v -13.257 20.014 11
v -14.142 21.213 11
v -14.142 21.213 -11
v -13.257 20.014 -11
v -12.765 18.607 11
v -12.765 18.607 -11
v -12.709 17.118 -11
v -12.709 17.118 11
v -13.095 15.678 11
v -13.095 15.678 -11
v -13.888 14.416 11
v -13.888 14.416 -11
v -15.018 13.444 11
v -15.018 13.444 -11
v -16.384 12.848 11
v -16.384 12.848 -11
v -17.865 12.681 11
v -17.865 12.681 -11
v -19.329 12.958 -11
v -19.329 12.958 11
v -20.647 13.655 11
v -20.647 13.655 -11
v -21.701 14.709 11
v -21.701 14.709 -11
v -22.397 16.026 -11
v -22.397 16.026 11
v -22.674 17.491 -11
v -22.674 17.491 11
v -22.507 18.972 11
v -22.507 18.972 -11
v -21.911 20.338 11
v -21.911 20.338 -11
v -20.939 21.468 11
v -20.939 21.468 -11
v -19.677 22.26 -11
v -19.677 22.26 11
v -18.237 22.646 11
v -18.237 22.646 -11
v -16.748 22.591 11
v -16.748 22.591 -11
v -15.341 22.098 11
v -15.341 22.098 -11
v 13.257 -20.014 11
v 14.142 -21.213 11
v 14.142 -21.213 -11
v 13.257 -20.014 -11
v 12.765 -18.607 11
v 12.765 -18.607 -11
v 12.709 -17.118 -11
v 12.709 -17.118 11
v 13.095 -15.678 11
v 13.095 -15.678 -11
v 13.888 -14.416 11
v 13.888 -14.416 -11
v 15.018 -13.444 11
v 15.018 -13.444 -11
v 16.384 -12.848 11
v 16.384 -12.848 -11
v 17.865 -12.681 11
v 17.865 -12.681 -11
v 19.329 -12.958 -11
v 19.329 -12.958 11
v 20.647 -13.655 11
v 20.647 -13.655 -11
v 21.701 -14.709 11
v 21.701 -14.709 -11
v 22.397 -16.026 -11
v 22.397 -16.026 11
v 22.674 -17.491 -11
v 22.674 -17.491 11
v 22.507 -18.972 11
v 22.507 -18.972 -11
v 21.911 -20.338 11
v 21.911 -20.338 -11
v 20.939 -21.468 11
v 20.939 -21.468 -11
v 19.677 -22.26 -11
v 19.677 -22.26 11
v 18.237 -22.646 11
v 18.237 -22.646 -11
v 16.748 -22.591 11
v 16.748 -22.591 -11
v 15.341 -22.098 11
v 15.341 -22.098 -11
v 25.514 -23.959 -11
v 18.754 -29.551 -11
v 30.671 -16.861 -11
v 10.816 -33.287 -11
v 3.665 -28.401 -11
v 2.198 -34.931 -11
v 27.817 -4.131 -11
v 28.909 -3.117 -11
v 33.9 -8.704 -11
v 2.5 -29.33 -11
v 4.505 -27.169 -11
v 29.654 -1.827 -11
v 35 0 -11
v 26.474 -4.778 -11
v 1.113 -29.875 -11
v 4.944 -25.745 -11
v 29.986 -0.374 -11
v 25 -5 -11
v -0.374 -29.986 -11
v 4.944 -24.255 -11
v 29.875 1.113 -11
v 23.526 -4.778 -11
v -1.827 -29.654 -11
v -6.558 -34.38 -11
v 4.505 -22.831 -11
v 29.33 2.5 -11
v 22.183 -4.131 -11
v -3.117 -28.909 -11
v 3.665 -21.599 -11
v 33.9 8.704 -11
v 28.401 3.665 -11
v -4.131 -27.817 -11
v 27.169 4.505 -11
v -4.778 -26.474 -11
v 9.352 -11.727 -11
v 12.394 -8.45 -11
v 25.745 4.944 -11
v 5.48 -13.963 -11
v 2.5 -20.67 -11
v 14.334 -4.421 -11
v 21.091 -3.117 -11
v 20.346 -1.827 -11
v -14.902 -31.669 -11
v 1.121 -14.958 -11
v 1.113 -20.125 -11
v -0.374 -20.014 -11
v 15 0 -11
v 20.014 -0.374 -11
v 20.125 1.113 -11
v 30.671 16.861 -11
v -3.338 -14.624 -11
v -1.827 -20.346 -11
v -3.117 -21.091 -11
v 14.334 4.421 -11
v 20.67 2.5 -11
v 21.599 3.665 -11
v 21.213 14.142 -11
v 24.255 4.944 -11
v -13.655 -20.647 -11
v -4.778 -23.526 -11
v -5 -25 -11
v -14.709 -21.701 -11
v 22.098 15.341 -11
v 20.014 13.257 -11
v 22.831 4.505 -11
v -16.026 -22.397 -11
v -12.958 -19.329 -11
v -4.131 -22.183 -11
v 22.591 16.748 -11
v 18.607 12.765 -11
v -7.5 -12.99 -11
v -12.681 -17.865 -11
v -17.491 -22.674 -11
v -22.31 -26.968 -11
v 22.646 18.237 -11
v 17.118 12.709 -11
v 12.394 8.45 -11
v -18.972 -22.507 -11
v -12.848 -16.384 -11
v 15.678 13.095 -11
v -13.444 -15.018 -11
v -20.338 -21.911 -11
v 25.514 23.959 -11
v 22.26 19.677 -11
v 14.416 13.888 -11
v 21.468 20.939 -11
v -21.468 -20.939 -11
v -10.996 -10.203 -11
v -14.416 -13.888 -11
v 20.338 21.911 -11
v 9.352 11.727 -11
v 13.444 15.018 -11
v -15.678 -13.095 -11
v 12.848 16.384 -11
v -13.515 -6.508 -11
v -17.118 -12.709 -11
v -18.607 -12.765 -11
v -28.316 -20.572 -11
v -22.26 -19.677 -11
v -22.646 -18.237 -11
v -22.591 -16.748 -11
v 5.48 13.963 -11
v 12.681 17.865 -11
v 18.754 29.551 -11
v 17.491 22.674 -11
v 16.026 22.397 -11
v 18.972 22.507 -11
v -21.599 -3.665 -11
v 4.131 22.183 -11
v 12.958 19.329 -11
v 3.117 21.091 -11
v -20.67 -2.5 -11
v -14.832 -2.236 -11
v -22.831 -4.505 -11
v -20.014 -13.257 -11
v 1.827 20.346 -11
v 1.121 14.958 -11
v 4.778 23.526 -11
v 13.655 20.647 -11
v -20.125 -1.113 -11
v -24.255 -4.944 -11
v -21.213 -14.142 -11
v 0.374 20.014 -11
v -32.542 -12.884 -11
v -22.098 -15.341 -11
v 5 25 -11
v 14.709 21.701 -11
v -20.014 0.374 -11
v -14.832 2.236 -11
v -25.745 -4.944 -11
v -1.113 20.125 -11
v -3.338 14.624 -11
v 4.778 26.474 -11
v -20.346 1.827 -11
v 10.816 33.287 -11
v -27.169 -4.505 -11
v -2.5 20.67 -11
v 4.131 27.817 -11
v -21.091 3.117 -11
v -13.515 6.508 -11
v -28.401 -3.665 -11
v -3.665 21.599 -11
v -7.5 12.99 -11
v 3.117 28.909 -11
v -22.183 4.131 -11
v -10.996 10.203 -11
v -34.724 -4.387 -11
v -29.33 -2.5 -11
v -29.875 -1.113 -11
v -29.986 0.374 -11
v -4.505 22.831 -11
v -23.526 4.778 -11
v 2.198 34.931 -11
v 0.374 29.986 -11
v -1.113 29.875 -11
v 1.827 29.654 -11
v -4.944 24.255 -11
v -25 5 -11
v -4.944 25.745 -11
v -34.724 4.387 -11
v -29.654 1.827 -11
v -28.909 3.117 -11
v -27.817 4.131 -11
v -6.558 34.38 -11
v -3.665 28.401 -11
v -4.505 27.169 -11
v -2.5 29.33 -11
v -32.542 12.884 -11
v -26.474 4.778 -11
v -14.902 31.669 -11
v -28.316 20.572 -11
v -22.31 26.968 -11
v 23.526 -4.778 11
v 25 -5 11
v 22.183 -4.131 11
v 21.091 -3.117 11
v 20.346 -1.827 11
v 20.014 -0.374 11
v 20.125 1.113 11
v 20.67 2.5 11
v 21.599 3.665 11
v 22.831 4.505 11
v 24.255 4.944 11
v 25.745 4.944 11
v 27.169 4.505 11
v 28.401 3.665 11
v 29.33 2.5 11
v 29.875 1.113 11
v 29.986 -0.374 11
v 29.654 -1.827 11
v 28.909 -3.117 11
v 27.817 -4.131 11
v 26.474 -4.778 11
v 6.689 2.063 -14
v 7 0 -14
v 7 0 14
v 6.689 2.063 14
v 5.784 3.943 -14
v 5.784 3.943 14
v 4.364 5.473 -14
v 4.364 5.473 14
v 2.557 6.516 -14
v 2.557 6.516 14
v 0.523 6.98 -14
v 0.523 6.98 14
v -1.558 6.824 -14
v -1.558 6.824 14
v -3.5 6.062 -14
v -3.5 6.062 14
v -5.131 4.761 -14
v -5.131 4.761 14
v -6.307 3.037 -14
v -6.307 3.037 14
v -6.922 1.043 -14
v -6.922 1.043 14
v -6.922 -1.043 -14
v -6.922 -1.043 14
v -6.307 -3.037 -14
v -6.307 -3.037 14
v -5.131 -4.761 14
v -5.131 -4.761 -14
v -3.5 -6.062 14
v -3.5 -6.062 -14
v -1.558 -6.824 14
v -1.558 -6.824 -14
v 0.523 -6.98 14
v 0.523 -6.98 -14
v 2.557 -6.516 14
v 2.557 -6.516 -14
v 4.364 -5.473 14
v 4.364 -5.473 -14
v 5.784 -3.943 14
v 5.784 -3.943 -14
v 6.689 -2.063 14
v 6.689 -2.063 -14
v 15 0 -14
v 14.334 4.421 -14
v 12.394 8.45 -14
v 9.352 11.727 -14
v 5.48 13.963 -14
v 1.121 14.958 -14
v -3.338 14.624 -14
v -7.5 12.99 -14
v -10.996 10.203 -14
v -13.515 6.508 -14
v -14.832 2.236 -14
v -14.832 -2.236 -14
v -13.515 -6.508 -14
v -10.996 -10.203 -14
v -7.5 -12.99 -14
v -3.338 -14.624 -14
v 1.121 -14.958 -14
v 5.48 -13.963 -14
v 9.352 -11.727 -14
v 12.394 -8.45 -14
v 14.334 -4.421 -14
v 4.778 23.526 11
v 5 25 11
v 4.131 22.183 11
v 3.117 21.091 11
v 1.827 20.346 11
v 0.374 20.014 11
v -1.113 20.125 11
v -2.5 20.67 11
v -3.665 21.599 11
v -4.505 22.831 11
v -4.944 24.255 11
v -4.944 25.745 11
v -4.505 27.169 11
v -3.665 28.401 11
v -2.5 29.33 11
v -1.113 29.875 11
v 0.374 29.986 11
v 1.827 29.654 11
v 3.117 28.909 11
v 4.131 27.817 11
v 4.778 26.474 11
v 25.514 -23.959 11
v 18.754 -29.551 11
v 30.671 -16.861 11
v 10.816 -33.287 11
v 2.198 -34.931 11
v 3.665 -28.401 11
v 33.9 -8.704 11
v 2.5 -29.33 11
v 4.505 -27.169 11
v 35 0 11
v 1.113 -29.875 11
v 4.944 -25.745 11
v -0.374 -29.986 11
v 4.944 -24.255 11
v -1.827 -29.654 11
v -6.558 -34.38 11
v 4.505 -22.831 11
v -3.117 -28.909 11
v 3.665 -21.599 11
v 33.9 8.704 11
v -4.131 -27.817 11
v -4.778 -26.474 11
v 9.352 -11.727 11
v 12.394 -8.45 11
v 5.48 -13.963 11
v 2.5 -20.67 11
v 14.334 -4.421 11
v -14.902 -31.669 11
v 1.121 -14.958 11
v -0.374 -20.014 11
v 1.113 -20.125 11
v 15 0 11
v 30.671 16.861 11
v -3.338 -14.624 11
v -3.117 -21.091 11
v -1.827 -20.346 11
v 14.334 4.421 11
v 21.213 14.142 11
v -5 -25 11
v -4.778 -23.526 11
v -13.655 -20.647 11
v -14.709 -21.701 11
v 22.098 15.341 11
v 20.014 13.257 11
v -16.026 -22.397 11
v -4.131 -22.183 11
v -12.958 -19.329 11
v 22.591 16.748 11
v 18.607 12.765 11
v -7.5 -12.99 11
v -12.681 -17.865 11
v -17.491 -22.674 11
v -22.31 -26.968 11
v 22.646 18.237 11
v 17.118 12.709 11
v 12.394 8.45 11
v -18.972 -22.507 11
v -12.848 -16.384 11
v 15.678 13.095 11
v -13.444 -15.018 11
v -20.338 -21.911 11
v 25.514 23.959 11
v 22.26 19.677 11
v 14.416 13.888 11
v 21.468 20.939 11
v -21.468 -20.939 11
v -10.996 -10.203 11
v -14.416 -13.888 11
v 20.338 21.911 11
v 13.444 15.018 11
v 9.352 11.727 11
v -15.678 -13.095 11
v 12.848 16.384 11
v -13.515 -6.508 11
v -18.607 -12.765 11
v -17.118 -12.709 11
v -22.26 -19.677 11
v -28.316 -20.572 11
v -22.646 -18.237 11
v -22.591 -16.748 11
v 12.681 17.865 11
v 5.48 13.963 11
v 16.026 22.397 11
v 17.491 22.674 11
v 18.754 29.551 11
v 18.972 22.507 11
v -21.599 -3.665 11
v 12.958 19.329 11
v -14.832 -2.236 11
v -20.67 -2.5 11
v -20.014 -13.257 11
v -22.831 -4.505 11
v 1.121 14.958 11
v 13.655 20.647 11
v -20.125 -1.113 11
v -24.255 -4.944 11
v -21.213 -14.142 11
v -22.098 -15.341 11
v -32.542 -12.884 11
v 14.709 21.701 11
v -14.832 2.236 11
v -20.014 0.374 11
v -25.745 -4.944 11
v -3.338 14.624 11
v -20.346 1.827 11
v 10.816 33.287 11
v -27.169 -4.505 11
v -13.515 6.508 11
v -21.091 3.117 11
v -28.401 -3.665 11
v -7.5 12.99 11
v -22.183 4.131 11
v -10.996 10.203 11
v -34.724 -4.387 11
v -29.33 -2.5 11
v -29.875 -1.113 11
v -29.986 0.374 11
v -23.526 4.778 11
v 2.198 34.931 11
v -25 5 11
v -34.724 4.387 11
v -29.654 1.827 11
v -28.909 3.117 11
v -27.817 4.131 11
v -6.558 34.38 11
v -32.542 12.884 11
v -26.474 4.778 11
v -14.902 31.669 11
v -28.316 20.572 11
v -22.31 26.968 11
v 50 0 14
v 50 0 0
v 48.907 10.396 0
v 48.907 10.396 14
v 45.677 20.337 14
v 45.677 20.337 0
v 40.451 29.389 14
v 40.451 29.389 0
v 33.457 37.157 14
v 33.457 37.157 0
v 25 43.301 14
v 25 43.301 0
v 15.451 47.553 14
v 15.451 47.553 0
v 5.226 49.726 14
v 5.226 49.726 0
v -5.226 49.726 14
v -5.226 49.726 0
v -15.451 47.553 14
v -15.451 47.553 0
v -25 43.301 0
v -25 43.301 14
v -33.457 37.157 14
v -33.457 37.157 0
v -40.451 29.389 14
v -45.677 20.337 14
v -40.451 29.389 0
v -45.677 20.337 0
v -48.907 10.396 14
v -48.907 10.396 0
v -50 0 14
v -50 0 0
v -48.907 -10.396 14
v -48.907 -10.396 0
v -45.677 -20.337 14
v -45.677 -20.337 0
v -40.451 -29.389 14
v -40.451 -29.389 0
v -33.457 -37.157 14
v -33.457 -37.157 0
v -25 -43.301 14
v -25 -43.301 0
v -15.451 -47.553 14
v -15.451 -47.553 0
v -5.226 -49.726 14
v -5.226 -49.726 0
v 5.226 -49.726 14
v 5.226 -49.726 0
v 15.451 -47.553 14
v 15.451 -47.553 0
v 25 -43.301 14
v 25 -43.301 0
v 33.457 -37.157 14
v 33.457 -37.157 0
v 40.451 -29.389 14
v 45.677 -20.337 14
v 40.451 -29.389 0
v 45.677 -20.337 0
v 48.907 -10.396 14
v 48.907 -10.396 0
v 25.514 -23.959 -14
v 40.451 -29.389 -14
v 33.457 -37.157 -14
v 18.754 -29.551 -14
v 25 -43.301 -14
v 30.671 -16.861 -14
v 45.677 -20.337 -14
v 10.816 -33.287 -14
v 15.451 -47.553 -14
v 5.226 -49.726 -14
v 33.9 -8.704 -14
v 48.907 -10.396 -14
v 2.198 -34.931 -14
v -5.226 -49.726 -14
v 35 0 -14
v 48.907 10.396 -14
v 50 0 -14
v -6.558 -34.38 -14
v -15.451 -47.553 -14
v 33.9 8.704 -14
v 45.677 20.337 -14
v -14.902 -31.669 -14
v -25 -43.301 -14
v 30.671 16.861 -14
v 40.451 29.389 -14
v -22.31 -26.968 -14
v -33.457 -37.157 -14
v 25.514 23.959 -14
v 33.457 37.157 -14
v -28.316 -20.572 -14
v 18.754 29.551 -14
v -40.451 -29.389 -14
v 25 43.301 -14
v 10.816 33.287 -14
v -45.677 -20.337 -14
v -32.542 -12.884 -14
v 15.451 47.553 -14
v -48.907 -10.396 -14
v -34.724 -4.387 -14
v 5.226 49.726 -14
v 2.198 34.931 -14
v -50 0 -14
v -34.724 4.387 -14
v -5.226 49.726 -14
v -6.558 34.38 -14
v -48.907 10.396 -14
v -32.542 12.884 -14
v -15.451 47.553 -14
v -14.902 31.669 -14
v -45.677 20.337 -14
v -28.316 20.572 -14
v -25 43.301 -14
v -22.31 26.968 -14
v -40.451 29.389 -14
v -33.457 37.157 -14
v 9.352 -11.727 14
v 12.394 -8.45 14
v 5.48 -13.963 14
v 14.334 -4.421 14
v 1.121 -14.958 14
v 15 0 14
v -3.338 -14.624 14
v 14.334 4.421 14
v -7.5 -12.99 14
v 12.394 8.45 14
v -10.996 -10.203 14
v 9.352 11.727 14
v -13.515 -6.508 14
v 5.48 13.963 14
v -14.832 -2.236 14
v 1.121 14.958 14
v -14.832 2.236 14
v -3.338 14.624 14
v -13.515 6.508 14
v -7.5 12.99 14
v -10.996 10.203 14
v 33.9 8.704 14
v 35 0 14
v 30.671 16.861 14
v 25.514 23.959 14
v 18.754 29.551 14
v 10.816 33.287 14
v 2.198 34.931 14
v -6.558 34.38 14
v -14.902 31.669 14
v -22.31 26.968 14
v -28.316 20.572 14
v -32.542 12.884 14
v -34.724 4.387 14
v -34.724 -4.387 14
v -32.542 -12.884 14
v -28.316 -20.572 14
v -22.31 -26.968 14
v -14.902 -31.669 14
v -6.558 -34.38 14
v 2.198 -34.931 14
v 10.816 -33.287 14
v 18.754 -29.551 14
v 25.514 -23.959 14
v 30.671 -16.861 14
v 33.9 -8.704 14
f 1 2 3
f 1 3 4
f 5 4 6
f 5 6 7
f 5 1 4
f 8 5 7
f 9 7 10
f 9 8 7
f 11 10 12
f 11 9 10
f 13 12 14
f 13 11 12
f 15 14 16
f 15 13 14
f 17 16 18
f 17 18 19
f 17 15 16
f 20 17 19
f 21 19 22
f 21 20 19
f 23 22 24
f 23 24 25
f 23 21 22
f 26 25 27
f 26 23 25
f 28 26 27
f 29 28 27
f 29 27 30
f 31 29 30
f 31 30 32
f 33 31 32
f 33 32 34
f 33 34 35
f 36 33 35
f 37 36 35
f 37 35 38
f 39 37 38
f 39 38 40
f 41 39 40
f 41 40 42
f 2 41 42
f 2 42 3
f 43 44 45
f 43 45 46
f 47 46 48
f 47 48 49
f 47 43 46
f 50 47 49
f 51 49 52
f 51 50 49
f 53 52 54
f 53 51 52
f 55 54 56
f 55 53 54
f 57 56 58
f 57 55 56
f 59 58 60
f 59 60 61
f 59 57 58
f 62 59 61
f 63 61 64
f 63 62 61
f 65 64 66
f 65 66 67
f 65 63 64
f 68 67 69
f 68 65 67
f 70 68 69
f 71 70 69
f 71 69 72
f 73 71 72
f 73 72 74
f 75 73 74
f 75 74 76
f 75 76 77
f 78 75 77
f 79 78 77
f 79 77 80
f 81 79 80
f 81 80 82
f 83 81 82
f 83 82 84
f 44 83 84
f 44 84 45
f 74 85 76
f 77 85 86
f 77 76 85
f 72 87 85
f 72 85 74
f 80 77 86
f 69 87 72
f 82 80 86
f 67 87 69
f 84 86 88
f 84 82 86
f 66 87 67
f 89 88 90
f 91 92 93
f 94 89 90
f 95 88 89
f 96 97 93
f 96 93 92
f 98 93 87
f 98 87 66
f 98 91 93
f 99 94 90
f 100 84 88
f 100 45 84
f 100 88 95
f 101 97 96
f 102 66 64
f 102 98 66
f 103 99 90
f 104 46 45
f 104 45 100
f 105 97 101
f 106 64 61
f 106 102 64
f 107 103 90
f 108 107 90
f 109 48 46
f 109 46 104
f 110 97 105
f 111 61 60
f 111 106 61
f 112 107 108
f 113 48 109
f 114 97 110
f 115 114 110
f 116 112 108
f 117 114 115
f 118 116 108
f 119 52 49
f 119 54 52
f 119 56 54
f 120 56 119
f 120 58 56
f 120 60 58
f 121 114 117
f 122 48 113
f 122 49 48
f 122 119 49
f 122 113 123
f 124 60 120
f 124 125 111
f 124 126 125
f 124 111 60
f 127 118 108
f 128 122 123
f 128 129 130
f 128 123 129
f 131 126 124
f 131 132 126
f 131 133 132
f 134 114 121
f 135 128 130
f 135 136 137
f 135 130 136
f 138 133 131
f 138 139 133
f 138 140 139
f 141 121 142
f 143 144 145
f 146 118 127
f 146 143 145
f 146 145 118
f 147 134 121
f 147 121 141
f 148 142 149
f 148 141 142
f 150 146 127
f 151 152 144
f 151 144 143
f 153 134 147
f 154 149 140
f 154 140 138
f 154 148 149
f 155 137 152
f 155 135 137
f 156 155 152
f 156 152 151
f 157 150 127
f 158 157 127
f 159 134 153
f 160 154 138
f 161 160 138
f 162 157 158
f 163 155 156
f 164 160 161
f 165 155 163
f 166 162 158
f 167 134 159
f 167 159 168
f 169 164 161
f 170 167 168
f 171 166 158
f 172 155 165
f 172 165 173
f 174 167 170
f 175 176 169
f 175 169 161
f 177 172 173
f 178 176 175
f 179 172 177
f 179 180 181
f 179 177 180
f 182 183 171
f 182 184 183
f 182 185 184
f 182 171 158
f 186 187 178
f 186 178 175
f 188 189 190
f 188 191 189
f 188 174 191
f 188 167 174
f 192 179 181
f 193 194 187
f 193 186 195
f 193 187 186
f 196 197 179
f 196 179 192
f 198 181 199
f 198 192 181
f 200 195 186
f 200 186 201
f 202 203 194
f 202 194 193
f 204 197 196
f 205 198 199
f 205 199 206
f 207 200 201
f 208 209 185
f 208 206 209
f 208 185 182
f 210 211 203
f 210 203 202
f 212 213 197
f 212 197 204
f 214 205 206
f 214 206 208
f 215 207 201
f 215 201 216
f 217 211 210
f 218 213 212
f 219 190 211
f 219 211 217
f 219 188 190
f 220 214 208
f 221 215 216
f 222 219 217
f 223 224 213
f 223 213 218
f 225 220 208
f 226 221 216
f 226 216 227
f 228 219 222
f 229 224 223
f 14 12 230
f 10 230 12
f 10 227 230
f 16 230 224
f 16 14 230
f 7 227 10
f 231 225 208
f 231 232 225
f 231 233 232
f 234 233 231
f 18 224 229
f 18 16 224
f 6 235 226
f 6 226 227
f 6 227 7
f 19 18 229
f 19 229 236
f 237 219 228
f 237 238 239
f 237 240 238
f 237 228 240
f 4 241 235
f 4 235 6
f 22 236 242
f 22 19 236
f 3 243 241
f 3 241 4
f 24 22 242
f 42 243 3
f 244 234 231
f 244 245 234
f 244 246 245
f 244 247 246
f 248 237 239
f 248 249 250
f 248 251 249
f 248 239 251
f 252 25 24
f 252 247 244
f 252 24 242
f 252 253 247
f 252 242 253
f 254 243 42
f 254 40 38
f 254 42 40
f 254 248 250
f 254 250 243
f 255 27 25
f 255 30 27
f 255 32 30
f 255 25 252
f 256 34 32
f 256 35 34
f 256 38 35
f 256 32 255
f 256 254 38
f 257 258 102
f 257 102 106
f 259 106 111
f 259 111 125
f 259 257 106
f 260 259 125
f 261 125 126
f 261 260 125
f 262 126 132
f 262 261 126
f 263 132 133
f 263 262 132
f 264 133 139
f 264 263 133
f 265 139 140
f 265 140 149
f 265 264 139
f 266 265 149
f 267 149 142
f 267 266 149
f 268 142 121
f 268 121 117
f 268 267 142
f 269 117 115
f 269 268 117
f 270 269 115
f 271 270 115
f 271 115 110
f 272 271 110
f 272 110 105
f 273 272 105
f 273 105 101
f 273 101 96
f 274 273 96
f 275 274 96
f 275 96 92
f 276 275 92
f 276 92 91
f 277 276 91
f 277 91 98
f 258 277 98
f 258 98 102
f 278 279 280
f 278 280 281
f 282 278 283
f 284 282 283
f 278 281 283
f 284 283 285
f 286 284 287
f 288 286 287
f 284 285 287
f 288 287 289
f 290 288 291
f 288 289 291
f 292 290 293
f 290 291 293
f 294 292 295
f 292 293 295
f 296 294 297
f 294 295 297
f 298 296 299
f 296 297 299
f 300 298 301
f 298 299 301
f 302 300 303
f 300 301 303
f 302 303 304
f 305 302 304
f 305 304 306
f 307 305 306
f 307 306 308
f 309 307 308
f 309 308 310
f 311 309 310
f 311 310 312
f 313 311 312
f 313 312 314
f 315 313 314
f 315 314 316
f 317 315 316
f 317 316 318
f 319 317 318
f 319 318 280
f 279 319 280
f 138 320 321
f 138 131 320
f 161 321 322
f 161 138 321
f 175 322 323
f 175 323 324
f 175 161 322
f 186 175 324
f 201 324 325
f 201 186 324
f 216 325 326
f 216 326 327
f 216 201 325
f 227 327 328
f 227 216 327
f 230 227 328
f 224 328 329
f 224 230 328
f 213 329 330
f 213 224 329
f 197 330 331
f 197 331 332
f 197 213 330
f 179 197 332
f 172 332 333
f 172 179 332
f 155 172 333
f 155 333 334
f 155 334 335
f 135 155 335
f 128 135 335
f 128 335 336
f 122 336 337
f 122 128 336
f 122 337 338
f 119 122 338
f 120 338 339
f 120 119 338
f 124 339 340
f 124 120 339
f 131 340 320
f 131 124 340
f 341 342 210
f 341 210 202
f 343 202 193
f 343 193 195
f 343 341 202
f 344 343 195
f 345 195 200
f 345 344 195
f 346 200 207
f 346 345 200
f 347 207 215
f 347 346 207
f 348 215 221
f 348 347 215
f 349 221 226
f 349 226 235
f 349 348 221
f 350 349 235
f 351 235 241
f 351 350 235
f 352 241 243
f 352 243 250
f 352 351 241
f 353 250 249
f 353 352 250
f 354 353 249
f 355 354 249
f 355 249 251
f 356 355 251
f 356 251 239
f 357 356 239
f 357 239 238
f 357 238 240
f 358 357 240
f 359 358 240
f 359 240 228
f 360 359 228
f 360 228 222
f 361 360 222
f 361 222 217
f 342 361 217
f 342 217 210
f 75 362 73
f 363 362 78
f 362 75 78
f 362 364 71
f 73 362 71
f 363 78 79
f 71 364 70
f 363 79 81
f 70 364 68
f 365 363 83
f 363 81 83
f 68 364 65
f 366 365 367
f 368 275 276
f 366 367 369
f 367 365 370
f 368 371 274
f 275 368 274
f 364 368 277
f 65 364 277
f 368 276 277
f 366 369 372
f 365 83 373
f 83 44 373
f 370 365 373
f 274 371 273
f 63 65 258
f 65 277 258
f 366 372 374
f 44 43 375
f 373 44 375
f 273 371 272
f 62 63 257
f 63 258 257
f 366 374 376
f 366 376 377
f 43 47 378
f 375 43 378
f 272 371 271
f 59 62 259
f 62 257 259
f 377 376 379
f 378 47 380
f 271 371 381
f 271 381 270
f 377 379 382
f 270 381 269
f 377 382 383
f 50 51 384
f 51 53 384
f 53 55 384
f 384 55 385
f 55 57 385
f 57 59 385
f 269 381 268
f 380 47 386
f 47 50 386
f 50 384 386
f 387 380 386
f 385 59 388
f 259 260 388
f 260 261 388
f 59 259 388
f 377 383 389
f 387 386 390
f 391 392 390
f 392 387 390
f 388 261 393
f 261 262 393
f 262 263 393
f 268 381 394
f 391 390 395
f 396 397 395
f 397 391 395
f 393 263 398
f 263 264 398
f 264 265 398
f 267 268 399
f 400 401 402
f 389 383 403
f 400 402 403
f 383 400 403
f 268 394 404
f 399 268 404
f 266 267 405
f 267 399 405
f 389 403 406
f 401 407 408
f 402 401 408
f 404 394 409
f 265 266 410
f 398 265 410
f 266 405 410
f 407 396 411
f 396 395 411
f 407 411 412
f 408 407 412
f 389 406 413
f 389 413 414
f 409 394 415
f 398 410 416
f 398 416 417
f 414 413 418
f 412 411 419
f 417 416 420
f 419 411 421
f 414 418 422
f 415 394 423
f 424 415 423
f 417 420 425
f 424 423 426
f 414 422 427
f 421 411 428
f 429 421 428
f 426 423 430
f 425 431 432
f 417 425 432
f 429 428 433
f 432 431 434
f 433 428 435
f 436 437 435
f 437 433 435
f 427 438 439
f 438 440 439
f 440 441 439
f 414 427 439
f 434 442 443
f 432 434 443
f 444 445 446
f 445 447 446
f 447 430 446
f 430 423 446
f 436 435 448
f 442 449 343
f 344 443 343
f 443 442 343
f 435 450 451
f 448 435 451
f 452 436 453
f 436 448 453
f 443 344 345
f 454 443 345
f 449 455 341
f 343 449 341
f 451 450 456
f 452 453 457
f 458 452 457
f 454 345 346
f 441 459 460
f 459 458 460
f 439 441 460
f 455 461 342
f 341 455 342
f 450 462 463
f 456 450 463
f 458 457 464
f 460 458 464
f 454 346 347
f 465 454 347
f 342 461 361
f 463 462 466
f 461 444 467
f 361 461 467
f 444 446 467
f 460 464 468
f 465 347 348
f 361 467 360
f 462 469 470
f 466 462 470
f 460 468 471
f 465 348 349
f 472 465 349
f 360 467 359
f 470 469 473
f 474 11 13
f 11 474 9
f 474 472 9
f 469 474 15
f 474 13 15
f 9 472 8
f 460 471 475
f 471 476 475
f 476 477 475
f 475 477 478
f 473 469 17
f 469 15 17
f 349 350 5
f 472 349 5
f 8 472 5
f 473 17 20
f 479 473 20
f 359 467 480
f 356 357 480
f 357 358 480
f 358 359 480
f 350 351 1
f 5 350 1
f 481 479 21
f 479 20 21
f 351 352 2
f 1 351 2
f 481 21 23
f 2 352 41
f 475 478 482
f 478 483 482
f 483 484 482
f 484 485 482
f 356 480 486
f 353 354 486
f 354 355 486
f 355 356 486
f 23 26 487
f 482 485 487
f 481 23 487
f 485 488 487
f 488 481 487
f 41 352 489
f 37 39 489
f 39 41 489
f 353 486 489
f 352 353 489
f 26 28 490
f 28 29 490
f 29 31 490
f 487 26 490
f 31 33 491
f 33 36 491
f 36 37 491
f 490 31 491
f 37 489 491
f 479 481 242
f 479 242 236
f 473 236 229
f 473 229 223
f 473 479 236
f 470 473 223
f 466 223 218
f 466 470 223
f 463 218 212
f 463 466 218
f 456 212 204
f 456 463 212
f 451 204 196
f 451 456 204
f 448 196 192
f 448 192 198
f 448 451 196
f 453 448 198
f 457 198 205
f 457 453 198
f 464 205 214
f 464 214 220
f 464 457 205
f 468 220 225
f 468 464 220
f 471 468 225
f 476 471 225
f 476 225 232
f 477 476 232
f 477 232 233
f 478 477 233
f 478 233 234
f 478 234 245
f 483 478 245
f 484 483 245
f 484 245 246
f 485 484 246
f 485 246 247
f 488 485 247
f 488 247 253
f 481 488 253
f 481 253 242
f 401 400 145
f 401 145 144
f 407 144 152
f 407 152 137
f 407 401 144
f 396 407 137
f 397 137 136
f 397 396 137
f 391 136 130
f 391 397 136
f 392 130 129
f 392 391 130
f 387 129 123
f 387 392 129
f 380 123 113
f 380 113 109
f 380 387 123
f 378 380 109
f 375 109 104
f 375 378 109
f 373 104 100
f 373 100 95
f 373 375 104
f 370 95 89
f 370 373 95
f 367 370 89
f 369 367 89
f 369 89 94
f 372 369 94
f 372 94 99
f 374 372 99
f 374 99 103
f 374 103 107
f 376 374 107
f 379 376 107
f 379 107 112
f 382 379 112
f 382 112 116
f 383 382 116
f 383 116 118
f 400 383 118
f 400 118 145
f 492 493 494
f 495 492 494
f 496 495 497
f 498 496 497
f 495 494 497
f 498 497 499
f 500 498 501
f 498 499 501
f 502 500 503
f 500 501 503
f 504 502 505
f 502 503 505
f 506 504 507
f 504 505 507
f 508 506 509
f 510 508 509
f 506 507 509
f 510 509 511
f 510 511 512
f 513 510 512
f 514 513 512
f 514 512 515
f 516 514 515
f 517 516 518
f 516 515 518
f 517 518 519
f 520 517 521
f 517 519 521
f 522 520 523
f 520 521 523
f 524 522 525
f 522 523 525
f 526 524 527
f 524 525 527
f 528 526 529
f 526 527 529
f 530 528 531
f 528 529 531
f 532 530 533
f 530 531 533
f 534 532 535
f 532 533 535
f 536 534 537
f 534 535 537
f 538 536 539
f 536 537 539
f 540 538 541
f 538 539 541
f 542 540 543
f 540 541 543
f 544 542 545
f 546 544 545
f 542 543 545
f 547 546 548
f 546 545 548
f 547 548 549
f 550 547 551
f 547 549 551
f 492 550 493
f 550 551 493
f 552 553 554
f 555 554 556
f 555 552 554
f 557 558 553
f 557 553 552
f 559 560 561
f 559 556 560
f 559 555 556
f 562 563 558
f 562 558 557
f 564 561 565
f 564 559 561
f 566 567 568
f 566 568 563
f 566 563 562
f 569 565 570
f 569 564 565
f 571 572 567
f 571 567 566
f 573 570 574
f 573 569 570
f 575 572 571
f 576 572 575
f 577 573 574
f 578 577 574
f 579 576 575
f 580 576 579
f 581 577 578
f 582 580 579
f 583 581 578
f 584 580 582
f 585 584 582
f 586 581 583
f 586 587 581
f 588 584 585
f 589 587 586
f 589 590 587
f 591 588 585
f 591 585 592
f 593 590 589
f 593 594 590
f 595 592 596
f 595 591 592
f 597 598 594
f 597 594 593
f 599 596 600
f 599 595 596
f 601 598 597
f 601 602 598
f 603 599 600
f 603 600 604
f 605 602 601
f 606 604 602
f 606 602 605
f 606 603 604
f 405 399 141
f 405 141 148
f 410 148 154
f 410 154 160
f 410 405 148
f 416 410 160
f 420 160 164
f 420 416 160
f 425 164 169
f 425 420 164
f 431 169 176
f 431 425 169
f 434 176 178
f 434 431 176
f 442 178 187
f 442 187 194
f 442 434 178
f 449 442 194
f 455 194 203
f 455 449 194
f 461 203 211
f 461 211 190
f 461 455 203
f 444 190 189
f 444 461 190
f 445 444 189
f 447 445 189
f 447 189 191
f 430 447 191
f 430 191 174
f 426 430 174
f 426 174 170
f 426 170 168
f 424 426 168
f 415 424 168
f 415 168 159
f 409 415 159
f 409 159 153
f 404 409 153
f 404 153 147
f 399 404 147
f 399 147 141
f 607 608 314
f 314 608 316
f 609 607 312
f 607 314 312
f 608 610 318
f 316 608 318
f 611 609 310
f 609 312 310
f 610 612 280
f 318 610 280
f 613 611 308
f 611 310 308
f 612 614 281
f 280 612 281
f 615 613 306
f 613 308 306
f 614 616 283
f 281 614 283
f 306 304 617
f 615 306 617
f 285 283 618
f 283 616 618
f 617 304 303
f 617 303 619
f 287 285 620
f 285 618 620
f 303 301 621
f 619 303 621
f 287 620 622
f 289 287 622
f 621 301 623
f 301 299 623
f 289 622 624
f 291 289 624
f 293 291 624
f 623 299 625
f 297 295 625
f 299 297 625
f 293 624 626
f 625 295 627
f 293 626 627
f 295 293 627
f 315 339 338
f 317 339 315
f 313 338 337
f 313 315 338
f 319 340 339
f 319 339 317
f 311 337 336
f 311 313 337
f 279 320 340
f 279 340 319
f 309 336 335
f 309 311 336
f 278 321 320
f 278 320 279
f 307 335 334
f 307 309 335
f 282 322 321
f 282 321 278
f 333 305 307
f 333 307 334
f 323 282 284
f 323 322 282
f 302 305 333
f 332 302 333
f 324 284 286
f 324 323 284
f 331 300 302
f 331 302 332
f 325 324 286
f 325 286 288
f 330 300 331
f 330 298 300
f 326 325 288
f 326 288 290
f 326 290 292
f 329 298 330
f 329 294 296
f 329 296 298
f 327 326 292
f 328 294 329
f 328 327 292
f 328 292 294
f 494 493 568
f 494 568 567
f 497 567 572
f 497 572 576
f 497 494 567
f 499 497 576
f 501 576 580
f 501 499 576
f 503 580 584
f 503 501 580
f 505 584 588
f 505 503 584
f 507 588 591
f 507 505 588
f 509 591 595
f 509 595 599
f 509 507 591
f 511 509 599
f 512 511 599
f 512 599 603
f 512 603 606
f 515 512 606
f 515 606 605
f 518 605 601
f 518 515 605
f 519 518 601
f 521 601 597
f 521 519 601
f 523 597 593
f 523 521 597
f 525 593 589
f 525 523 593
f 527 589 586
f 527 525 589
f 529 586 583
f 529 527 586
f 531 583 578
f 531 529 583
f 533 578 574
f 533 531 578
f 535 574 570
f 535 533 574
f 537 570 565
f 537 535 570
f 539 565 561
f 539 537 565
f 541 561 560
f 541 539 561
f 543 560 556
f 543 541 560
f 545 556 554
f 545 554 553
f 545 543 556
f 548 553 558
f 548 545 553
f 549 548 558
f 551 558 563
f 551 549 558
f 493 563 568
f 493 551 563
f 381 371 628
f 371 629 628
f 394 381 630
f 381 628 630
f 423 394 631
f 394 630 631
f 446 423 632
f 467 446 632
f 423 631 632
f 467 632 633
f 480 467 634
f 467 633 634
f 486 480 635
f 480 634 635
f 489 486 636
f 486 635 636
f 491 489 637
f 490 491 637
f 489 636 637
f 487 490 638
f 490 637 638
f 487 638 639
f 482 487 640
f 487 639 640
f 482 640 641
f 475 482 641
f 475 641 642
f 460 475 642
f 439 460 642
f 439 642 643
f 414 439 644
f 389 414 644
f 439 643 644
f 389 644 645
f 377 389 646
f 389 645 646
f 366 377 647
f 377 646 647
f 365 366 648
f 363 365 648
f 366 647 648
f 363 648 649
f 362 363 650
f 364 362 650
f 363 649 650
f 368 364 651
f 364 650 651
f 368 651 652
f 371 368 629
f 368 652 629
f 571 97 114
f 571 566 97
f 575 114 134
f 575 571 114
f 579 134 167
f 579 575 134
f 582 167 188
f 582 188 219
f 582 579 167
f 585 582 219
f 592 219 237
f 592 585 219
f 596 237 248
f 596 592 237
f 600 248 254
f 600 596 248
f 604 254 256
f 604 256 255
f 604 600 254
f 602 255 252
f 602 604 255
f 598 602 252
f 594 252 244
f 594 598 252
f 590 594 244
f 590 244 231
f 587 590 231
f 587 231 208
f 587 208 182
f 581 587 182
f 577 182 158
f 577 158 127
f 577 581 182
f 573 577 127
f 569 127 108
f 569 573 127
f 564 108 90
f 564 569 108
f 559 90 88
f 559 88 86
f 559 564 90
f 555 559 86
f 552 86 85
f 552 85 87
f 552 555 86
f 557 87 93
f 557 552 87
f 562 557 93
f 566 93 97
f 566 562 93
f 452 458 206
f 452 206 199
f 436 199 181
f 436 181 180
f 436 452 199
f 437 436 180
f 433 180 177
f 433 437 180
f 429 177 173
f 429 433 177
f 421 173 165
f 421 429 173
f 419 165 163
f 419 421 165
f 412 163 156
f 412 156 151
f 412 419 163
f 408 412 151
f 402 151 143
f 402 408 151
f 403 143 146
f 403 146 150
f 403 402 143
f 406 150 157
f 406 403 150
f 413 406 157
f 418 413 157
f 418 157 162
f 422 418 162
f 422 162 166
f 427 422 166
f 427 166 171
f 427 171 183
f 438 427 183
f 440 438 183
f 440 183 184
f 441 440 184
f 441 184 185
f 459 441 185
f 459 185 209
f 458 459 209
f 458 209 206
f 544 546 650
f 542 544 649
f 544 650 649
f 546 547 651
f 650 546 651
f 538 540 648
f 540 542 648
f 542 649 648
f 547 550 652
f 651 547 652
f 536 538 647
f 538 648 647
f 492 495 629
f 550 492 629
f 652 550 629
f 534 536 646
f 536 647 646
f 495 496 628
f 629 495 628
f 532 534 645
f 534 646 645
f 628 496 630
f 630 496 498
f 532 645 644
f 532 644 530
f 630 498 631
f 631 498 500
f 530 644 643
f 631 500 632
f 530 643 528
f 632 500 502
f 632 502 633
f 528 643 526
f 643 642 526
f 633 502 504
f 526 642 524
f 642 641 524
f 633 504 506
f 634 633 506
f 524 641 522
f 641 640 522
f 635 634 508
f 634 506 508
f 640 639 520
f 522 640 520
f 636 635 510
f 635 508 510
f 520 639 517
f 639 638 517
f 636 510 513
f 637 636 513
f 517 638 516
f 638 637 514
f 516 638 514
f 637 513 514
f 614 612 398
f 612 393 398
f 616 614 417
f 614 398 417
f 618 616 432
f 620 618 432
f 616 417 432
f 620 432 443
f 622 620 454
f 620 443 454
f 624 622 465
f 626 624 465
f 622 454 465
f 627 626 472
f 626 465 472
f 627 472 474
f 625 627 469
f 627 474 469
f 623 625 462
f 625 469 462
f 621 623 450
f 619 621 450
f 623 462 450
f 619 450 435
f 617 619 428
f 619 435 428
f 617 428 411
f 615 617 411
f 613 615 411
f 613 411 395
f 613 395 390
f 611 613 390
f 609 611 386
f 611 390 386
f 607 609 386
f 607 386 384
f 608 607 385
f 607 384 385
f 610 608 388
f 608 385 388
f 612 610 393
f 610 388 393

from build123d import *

# Parameters (mm, degrees)
SKETCH2_R          = 5
CUT_EXTRUDE1_DEPTH = 12
CIRPATTERN1_COUNT  = 8


with BuildPart() as part:
    # Sketch1 → Revolve1 (revolve)
    with BuildSketch(Plane(origin=(0, 0, 0), x_dir=(1, 0, 0), z_dir=(0, 1, 0))):
        Polygon((7, 0), (7, 14), (15, 14), (15, 11), (35, 11), (35, 14), (50, 14), (50, 0), align=None)
    revolve(axis=Axis((0, 0, -184.045185168), (0, 0, 1)))

    # Sketch2 → Cut-Extrude1 (cut, through all)
    with BuildSketch(Plane(origin=(0, 0, -11), x_dir=(-1, 0, 0), z_dir=(0, 0, -1))):
        with Locations((0, -25)):
            Circle(SKETCH2_R)
    cut_extrude1 = extrude(amount=-CUT_EXTRUDE1_DEPTH, mode=Mode.SUBTRACT)

    # CirPattern1: Cut-Extrude1 ×8 about axis
    cirpattern1_axis = Axis((0, 0, 0), (0, 0, 1))
    for i in range(1, CIRPATTERN1_COUNT):
        add(cut_extrude1.rotate(cirpattern1_axis, i * 360 / CIRPATTERN1_COUNT), mode=Mode.SUBTRACT)

    # Mirror1: part across plane


with BuildPart() as part_1:
    add(part.part)
    add(part.part.mirror(Plane.XY))


solid = part_1.part
